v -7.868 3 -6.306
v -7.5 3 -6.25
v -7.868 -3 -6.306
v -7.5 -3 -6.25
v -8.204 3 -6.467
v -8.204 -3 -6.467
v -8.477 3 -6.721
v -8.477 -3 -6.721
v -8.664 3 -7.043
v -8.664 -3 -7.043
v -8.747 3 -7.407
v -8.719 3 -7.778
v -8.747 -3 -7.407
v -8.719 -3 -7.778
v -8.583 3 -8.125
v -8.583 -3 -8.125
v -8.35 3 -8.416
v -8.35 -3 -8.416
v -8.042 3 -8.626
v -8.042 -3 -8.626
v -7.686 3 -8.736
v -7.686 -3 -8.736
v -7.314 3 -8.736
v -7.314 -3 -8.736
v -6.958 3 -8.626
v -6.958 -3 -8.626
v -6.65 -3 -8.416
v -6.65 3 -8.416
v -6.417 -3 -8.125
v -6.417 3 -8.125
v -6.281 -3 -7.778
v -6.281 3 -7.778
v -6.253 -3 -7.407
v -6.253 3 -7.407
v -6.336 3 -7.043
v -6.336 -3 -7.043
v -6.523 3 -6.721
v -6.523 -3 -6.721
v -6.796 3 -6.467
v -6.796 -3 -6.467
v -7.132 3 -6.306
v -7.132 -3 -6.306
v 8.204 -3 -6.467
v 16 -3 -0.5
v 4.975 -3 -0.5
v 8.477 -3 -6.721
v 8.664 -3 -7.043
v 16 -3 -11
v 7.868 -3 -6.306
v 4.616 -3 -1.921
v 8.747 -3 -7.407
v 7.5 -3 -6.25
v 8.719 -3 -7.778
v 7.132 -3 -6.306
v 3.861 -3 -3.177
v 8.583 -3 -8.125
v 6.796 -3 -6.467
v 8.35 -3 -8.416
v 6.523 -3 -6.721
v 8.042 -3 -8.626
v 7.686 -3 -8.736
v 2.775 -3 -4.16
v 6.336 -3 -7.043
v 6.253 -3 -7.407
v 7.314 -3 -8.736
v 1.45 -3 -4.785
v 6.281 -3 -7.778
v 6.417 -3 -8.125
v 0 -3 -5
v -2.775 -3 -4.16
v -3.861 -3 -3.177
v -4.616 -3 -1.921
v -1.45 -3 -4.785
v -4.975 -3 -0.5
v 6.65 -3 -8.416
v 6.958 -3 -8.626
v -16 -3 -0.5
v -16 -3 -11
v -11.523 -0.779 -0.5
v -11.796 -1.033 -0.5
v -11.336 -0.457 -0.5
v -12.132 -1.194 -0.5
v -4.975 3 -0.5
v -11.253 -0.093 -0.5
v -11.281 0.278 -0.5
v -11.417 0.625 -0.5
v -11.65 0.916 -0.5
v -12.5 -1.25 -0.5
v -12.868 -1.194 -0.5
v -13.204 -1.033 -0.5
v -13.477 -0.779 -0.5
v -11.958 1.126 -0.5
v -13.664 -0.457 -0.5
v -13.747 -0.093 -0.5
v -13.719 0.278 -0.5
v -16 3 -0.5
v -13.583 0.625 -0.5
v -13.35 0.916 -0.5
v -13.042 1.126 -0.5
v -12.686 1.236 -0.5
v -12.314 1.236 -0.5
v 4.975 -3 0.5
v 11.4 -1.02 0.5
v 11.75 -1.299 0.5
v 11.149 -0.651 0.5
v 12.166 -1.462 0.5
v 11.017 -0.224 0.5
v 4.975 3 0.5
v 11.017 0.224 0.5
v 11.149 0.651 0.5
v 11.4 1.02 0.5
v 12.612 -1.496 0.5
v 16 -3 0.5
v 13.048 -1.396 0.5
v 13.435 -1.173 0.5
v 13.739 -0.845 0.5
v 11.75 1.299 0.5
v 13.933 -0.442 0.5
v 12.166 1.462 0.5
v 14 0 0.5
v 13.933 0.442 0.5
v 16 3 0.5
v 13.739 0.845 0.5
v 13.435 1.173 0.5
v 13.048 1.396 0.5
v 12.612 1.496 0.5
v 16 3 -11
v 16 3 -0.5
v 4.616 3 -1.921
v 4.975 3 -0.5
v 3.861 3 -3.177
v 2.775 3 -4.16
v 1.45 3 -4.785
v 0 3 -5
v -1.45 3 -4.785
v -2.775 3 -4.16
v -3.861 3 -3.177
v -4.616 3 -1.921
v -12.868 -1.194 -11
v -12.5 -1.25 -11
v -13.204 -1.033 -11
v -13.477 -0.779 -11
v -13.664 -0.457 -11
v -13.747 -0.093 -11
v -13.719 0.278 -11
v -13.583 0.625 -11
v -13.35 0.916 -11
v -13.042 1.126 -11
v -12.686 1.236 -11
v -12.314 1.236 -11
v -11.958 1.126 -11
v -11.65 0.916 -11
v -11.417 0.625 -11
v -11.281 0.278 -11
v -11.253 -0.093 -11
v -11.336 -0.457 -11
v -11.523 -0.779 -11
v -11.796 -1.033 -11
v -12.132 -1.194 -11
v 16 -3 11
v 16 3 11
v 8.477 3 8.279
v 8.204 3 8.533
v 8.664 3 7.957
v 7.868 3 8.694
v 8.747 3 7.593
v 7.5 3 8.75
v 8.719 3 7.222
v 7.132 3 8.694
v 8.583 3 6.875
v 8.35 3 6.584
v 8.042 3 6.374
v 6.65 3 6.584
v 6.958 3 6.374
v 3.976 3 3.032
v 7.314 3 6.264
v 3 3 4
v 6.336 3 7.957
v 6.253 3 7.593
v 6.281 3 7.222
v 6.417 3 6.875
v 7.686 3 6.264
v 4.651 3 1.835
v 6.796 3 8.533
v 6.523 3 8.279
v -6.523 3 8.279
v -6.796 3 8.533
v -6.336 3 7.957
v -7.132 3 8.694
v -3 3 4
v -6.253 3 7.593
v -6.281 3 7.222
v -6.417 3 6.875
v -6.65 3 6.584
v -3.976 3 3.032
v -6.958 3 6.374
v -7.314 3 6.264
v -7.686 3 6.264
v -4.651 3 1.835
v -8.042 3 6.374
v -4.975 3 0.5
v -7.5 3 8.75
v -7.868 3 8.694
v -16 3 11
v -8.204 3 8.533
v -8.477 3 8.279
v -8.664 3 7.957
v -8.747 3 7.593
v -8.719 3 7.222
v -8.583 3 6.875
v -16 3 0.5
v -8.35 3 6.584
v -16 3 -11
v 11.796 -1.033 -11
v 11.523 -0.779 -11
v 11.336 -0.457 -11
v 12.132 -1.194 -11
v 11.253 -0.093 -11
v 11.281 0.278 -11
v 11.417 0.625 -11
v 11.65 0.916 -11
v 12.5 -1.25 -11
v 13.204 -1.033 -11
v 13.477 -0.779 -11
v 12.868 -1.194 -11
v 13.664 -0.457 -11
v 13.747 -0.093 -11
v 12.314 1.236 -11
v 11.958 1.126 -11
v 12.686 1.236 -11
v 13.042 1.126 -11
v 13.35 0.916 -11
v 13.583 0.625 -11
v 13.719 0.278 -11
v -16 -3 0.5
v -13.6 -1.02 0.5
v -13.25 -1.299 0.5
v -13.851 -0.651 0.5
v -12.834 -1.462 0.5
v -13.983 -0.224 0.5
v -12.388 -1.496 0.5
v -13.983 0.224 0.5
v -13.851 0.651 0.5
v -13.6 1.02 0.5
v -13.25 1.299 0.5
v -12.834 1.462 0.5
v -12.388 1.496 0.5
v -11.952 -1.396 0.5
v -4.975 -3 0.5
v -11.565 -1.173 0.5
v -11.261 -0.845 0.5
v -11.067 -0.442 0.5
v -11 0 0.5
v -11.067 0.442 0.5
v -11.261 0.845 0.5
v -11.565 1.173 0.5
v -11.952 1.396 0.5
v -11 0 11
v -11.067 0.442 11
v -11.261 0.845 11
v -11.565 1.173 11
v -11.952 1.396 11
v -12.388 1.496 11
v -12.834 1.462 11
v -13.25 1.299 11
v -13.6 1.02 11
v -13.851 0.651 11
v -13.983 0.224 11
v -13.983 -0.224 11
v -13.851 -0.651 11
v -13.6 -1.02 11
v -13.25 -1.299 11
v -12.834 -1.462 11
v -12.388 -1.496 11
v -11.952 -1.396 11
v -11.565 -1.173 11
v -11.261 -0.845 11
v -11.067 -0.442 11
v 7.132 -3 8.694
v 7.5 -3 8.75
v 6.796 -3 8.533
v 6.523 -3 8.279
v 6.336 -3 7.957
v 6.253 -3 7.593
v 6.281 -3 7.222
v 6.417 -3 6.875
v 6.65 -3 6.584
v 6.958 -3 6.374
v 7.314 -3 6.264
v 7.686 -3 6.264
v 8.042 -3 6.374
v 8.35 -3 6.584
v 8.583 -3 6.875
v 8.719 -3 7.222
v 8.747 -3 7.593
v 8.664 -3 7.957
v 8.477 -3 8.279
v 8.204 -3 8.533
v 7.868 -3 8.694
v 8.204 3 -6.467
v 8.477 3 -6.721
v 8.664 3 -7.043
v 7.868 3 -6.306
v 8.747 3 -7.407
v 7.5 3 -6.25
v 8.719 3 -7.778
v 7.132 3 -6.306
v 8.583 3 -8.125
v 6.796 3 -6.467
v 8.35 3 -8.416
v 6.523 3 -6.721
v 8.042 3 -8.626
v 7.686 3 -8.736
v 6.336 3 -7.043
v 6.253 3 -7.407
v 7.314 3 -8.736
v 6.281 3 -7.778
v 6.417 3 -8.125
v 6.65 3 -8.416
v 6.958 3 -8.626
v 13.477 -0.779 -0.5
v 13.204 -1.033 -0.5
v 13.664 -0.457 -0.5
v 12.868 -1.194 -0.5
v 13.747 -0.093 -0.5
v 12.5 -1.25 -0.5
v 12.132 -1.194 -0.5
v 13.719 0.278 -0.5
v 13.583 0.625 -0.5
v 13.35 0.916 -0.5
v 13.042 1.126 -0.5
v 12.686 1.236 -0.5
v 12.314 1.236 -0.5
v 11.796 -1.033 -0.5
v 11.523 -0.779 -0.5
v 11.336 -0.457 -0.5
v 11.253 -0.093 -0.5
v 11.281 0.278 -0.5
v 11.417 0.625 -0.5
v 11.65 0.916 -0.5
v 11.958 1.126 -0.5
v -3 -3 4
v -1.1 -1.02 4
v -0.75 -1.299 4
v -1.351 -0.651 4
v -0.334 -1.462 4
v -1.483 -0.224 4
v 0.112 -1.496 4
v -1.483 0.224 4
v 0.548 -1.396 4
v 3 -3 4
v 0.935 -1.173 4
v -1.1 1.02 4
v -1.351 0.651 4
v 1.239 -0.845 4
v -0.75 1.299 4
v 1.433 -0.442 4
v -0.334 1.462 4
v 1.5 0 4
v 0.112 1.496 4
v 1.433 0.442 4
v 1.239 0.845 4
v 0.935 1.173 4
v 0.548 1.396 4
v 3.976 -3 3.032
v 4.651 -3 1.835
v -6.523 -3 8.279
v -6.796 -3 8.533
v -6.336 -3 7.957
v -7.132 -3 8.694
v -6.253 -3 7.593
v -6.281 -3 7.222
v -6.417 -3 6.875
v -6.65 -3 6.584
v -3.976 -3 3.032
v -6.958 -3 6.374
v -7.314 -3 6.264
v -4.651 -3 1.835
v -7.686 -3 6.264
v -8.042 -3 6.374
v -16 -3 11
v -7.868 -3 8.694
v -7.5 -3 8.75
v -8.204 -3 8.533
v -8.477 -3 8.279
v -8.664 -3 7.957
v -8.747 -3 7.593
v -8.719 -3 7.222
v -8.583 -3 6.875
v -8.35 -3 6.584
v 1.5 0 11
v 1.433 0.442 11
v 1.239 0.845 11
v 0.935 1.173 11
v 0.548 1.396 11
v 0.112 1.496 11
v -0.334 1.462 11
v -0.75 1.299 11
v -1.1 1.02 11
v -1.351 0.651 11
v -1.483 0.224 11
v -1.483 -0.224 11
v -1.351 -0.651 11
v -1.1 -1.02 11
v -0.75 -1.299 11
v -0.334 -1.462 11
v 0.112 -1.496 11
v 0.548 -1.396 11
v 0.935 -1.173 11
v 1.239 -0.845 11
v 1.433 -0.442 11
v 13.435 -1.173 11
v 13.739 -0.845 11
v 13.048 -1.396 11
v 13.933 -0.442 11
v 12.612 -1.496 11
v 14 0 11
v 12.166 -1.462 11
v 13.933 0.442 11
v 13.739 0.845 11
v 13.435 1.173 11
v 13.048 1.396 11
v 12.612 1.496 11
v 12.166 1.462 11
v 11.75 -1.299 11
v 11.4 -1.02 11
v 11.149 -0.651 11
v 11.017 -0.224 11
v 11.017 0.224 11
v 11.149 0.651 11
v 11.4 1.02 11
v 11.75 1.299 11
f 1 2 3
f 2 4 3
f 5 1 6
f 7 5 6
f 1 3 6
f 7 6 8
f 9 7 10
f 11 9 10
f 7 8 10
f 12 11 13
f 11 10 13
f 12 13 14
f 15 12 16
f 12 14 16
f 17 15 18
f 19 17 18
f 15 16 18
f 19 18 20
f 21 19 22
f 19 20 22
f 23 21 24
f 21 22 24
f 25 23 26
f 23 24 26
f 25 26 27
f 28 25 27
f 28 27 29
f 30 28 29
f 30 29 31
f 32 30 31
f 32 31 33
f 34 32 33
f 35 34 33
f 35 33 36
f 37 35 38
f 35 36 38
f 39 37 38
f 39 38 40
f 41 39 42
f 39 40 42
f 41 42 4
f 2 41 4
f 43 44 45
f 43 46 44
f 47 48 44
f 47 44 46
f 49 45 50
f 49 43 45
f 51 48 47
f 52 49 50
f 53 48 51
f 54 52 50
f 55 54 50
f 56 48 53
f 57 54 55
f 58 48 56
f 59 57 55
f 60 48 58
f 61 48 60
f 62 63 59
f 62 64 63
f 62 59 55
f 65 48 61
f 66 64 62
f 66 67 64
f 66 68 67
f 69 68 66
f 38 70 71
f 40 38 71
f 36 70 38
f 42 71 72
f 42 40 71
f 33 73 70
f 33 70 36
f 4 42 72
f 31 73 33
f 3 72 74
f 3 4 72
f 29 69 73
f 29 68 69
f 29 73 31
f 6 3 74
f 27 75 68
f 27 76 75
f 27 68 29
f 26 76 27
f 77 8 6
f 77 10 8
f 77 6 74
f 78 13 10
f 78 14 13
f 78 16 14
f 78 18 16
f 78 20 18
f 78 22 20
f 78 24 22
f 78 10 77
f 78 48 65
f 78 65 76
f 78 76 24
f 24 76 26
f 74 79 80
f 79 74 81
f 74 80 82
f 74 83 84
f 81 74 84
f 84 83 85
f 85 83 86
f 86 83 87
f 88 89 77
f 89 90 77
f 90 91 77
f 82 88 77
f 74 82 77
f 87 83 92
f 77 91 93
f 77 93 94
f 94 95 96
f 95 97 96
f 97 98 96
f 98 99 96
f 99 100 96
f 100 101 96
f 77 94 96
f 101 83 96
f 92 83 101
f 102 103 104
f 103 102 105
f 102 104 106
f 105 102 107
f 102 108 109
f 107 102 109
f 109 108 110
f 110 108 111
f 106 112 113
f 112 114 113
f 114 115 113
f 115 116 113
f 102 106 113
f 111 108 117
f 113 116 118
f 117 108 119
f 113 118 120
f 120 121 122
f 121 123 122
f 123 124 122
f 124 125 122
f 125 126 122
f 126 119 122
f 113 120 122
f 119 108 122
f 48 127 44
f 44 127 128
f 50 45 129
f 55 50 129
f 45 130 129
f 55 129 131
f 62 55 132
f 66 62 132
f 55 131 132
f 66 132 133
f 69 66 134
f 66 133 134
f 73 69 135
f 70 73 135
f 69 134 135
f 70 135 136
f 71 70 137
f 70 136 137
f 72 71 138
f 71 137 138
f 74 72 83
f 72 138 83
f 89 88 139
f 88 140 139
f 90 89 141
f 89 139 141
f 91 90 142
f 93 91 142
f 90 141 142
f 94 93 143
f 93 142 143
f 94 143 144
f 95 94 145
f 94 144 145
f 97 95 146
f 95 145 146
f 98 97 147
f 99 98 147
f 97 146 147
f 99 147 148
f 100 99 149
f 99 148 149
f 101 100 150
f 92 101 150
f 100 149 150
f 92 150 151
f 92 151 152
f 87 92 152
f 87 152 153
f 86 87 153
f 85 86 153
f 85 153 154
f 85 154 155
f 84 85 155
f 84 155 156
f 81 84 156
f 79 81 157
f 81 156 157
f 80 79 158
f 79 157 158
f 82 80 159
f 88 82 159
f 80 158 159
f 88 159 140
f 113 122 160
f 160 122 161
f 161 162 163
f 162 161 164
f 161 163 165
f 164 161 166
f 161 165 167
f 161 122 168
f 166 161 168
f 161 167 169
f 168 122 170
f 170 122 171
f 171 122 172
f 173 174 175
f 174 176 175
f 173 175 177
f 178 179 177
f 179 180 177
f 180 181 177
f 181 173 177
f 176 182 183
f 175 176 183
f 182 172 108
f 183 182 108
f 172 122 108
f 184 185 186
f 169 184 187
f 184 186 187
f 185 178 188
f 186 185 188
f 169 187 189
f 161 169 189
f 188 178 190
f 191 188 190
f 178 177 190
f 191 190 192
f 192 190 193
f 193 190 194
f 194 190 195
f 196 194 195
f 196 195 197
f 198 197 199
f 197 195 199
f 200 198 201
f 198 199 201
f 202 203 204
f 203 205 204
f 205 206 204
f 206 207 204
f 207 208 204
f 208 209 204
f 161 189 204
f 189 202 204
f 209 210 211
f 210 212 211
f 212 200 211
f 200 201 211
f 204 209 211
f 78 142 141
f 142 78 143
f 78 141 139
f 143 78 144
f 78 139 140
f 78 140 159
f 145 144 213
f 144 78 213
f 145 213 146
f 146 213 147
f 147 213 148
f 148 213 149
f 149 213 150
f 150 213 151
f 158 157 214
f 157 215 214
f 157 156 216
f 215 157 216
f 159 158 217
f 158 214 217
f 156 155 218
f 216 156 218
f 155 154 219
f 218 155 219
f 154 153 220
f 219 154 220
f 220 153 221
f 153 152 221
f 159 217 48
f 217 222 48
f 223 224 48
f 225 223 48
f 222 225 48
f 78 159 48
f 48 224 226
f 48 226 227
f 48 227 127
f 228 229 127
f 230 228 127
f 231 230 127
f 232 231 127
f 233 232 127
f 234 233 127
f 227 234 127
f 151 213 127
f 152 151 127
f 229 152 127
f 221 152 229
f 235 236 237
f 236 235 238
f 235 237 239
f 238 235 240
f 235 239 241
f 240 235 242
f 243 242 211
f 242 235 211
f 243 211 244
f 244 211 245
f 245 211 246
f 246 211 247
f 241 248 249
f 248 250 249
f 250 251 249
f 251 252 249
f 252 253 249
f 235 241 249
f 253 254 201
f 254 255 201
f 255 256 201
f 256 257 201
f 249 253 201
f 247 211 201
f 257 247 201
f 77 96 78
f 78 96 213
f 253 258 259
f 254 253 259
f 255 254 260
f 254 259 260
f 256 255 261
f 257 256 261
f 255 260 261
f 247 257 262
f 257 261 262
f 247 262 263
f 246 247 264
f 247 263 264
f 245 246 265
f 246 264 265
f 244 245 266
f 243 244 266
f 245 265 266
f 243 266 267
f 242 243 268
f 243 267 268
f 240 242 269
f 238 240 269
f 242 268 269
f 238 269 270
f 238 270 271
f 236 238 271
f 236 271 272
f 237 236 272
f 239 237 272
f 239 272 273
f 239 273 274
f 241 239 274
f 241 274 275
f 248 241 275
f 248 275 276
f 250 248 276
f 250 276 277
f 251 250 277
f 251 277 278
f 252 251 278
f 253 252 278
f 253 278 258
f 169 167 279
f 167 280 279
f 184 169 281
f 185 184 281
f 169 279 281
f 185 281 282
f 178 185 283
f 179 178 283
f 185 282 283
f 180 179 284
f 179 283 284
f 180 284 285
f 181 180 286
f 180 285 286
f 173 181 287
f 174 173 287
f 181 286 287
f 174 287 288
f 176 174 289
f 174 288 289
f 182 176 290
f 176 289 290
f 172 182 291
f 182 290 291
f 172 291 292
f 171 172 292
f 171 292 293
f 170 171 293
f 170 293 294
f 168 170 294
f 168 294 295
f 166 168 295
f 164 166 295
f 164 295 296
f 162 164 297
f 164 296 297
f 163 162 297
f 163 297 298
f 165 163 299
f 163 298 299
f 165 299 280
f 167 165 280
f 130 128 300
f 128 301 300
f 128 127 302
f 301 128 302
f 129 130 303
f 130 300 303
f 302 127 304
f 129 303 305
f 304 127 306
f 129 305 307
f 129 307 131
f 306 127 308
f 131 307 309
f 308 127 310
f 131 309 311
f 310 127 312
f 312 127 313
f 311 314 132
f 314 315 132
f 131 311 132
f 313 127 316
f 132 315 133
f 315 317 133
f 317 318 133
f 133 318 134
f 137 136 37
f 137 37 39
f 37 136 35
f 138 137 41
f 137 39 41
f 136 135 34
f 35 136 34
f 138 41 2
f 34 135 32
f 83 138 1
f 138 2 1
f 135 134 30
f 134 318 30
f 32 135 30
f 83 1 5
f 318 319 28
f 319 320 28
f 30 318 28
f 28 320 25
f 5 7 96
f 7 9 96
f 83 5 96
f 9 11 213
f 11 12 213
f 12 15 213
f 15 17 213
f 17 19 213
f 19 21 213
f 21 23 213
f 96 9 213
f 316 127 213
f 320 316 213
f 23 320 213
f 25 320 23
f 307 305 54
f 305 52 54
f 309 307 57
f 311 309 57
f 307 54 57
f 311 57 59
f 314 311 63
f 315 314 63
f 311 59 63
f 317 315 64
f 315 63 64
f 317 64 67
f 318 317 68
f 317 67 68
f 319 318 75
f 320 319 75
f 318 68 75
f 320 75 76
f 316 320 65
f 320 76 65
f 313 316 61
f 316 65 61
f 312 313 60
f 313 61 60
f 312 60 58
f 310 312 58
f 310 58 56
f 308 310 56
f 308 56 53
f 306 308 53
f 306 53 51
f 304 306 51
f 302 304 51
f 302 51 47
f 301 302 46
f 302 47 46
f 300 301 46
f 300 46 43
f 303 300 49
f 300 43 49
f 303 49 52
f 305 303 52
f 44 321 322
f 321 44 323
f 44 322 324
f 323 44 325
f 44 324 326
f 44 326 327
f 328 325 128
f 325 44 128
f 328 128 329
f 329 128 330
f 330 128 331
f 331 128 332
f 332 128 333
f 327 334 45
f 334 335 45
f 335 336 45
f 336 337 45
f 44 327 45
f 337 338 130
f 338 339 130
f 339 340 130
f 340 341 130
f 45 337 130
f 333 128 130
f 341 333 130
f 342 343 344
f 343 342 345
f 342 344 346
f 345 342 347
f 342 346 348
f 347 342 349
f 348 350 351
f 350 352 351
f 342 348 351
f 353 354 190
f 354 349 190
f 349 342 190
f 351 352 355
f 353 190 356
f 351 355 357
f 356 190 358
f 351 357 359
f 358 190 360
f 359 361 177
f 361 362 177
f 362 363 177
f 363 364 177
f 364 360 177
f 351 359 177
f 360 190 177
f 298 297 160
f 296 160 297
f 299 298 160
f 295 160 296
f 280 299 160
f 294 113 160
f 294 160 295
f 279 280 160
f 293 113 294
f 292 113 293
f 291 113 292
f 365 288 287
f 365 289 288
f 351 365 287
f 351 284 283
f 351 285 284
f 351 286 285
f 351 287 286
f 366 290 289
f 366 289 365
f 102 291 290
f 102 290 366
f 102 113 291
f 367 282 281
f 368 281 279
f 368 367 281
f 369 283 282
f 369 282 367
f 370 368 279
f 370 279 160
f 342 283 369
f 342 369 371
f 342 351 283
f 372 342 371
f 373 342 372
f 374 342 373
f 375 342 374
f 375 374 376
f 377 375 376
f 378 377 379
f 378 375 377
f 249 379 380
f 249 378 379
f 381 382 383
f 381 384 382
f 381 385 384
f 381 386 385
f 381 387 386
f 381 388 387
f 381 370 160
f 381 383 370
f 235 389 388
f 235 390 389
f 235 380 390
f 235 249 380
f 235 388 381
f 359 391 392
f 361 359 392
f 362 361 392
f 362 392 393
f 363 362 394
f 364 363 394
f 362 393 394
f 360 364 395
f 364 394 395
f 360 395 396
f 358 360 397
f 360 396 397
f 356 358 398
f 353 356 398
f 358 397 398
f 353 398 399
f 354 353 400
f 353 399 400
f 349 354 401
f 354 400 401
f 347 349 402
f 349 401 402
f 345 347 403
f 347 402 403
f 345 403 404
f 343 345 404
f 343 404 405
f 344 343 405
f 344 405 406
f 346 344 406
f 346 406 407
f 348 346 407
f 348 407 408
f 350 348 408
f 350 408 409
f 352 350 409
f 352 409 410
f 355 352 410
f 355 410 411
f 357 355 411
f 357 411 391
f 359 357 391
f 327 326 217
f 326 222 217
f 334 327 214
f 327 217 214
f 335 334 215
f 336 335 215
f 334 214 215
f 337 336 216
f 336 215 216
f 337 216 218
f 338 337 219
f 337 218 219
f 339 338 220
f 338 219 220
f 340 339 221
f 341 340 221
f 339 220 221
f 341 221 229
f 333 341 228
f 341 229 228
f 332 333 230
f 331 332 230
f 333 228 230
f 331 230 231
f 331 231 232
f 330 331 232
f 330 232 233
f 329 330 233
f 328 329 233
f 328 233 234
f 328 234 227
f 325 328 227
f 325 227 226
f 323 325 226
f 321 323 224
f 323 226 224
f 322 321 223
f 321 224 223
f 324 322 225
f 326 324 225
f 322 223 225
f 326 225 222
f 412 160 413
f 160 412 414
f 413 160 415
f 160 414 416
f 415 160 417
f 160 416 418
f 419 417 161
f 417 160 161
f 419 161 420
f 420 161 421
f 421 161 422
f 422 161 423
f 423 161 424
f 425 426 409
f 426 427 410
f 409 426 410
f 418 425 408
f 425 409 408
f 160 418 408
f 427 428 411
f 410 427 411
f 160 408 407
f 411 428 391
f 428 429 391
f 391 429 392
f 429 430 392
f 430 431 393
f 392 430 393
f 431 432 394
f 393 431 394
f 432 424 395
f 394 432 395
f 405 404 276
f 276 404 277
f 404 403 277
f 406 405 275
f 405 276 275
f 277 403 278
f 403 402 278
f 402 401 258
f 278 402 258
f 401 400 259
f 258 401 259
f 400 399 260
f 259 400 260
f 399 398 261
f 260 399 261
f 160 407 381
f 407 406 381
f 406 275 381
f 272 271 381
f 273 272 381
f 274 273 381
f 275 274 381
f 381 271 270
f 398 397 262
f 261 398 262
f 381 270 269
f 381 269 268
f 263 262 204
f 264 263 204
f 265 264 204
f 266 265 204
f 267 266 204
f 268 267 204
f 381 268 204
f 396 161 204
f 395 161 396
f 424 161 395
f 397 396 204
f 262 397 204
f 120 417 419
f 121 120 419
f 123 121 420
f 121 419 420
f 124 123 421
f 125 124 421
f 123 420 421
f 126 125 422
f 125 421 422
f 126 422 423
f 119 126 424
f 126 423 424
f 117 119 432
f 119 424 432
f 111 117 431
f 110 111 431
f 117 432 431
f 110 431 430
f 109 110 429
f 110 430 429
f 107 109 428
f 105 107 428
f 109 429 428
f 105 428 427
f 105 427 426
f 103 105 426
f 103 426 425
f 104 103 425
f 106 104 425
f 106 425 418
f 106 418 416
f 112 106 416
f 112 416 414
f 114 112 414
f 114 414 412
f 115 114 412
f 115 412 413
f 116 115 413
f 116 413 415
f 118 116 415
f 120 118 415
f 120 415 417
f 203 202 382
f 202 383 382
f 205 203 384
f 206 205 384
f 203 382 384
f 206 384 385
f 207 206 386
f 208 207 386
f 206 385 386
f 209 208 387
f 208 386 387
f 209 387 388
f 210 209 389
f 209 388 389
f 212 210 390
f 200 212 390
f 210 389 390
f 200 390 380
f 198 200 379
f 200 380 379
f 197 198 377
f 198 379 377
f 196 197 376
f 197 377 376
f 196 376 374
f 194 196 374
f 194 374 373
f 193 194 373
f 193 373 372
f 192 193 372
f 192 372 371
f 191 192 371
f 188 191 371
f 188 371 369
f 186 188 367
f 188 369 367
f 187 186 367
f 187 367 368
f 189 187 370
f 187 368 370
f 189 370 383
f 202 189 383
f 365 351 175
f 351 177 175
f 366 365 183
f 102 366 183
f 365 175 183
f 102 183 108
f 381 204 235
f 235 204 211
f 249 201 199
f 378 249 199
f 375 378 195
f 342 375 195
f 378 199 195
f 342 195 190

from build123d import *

# Parameters (mm, degrees)
EXTRUDE_1_DEPTH             = 3
EXTRUDE_1_2_DEPTH           = 3
SKETCH_3_W                  = 1.25
SKETCH_3_H                  = 22
HOLE_WIZARD_M3_1_AT_2_COUNT = 2
HOLE_WIZARD_M3_1_AT_2_PITCH = 25
SKETCH_5_W                  = 1.25
SKETCH_5_H                  = 6
HOLE_WIZARD_M3_2_AT_2_COUNT = 2
HOLE_WIZARD_M3_2_AT_2_PITCH = 15
HOLE_WIZARD_M3_2_AT_3_COUNT = 2
HOLE_WIZARD_M3_2_AT_3_PITCH = 15
HOLE_WIZARD_M3_2_AT_4_COUNT = 2
HOLE_WIZARD_M3_2_AT_4_PITCH = 21.213203436
SKETCH_6_R                  = 1.5
CUT_EXTRUDE_1_DEPTH         = 23


with BuildPart() as part:
    # 草图1 → 凸台-拉伸1 (new body, symmetric)
    with BuildSketch(Plane(origin=(0, 0, 0), x_dir=(1, 0, 0), z_dir=(0, 1, 0))):
        with BuildLine():
            Line((-3, -4), (3, -4))
            ThreePointArc((3, -4), (4.354584455, -2.457151648), (4.974937186, -0.5))
            Line((4.974937186, -0.5), (16, -0.5))
            Line((16, -0.5), (16, -11))
            Line((16, -11), (-16, -11))
            Line((-16, -11), (-16, -0.5))
            Line((-16, -0.5), (-4.974937186, -0.5))
            ThreePointArc((-4.974937186, -0.5), (-4.354584455, -2.457151648), (-3, -4))
        make_face()
    extrude(amount=EXTRUDE_1_DEPTH, both=True)


with BuildPart() as body_2:
    # 草图1 → Extrude 1 2 (new body, symmetric)
    with BuildSketch(Plane(origin=(0, 0, 0), x_dir=(1, 0, 0), z_dir=(0, 1, 0))):
        with BuildLine():
            Line((-16, 11), (16, 11))
            Line((16, 11), (16, 0.5))
            Line((16, 0.5), (4.974937186, 0.5))
            ThreePointArc((4.974937186, 0.5), (0, 5), (-4.974937186, 0.5))
            Line((-4.974937186, 0.5), (-16, 0.5))
            Line((-16, 0.5), (-16, 11))
        make_face()
    extrude(amount=EXTRUDE_1_2_DEPTH, both=True)


with BuildPart() as hole_wizard_m3_1_tool:
    # 草图3 → M3 螺纹孔1 (revolve)
    with BuildSketch(Plane(origin=(-12.5, 0, 11), x_dir=(0, -1, 0), z_dir=(1, 0, 0))):
        with Locations((0.625, 11)):
            Rectangle(SKETCH_3_W, SKETCH_3_H)
    hole_wizard_m3_1 = revolve(axis=Axis((-12.5, 0, 17.35), (0, 0, -1)))


with BuildPart() as part_1:
    add(part.part)

    # M3 螺纹孔1: cut by hole_wizard_m3_1_tool
    add(hole_wizard_m3_1_tool.part, mode=Mode.SUBTRACT)


with BuildPart() as body_2_1:
    add(body_2.part)

    # M3 螺纹孔1: cut by hole_wizard_m3_1_tool
    add(hole_wizard_m3_1_tool.part, mode=Mode.SUBTRACT)


with BuildPart() as hole_wizard_m3_1_at_2_tool:
    # M3 螺纹孔1 at 2: M3 螺纹孔1 ×2
    with Locations(*[(i * HOLE_WIZARD_M3_1_AT_2_PITCH, 0, 0) for i in range(1, HOLE_WIZARD_M3_1_AT_2_COUNT)]):
        add(hole_wizard_m3_1)


with BuildPart() as part_2:
    add(part_1.part)

    # M3 螺纹孔1 at 2: cut by hole_wizard_m3_1_at_2_tool
    add(hole_wizard_m3_1_at_2_tool.part, mode=Mode.SUBTRACT)


with BuildPart() as body_2_2:
    add(body_2_1.part)

    # M3 螺纹孔1 at 2: cut by hole_wizard_m3_1_at_2_tool
    add(hole_wizard_m3_1_at_2_tool.part, mode=Mode.SUBTRACT)

    # 草图5 → M3 螺纹孔2 (revolve, cut)
    with BuildSketch(Plane(origin=(-7.5, 3, -7.5), x_dir=(0, 0, 1), z_dir=(1, 0, 0))):
        with Locations((0.625, 3)):
            Rectangle(SKETCH_5_W, SKETCH_5_H)
    hole_wizard_m3_2 = revolve(axis=Axis((-7.5, 9.35, -7.5), (0, -1, 0)), mode=Mode.SUBTRACT)

    # M3 螺纹孔2 at 2: M3 螺纹孔2 ×2
    with Locations(*[(i * HOLE_WIZARD_M3_2_AT_2_PITCH, 0, 0) for i in range(1, HOLE_WIZARD_M3_2_AT_2_COUNT)]):
        add(hole_wizard_m3_2, mode=Mode.SUBTRACT)


with BuildPart() as part_3:
    add(part_2.part)

    # M3 螺纹孔2 at 3: M3 螺纹孔2 ×2
    with Locations(*[(0, 0, i * HOLE_WIZARD_M3_2_AT_3_PITCH) for i in range(1, HOLE_WIZARD_M3_2_AT_3_COUNT)]):
        add(hole_wizard_m3_2, mode=Mode.SUBTRACT)

    # M3 螺纹孔2 at 4: M3 螺纹孔2 ×2
    with Locations(*[Vector(0.707106781, 0, 0.707106781) * (i * HOLE_WIZARD_M3_2_AT_4_PITCH) for i in range(1, HOLE_WIZARD_M3_2_AT_4_COUNT)]):
        add(hole_wizard_m3_2, mode=Mode.SUBTRACT)

    # 草图6 → 切除-拉伸1 (cut, through all)
    with BuildSketch(Plane.XY.offset(11)):
        Circle(SKETCH_6_R)
        with Locations((-12.5, 0)):
            Circle(SKETCH_6_R)
        with Locations((12.5, 0)):
            Circle(SKETCH_6_R)
    extrude(amount=-CUT_EXTRUDE_1_DEPTH, mode=Mode.SUBTRACT)


solid = Compound([body_2_2.part, part_3.part])
